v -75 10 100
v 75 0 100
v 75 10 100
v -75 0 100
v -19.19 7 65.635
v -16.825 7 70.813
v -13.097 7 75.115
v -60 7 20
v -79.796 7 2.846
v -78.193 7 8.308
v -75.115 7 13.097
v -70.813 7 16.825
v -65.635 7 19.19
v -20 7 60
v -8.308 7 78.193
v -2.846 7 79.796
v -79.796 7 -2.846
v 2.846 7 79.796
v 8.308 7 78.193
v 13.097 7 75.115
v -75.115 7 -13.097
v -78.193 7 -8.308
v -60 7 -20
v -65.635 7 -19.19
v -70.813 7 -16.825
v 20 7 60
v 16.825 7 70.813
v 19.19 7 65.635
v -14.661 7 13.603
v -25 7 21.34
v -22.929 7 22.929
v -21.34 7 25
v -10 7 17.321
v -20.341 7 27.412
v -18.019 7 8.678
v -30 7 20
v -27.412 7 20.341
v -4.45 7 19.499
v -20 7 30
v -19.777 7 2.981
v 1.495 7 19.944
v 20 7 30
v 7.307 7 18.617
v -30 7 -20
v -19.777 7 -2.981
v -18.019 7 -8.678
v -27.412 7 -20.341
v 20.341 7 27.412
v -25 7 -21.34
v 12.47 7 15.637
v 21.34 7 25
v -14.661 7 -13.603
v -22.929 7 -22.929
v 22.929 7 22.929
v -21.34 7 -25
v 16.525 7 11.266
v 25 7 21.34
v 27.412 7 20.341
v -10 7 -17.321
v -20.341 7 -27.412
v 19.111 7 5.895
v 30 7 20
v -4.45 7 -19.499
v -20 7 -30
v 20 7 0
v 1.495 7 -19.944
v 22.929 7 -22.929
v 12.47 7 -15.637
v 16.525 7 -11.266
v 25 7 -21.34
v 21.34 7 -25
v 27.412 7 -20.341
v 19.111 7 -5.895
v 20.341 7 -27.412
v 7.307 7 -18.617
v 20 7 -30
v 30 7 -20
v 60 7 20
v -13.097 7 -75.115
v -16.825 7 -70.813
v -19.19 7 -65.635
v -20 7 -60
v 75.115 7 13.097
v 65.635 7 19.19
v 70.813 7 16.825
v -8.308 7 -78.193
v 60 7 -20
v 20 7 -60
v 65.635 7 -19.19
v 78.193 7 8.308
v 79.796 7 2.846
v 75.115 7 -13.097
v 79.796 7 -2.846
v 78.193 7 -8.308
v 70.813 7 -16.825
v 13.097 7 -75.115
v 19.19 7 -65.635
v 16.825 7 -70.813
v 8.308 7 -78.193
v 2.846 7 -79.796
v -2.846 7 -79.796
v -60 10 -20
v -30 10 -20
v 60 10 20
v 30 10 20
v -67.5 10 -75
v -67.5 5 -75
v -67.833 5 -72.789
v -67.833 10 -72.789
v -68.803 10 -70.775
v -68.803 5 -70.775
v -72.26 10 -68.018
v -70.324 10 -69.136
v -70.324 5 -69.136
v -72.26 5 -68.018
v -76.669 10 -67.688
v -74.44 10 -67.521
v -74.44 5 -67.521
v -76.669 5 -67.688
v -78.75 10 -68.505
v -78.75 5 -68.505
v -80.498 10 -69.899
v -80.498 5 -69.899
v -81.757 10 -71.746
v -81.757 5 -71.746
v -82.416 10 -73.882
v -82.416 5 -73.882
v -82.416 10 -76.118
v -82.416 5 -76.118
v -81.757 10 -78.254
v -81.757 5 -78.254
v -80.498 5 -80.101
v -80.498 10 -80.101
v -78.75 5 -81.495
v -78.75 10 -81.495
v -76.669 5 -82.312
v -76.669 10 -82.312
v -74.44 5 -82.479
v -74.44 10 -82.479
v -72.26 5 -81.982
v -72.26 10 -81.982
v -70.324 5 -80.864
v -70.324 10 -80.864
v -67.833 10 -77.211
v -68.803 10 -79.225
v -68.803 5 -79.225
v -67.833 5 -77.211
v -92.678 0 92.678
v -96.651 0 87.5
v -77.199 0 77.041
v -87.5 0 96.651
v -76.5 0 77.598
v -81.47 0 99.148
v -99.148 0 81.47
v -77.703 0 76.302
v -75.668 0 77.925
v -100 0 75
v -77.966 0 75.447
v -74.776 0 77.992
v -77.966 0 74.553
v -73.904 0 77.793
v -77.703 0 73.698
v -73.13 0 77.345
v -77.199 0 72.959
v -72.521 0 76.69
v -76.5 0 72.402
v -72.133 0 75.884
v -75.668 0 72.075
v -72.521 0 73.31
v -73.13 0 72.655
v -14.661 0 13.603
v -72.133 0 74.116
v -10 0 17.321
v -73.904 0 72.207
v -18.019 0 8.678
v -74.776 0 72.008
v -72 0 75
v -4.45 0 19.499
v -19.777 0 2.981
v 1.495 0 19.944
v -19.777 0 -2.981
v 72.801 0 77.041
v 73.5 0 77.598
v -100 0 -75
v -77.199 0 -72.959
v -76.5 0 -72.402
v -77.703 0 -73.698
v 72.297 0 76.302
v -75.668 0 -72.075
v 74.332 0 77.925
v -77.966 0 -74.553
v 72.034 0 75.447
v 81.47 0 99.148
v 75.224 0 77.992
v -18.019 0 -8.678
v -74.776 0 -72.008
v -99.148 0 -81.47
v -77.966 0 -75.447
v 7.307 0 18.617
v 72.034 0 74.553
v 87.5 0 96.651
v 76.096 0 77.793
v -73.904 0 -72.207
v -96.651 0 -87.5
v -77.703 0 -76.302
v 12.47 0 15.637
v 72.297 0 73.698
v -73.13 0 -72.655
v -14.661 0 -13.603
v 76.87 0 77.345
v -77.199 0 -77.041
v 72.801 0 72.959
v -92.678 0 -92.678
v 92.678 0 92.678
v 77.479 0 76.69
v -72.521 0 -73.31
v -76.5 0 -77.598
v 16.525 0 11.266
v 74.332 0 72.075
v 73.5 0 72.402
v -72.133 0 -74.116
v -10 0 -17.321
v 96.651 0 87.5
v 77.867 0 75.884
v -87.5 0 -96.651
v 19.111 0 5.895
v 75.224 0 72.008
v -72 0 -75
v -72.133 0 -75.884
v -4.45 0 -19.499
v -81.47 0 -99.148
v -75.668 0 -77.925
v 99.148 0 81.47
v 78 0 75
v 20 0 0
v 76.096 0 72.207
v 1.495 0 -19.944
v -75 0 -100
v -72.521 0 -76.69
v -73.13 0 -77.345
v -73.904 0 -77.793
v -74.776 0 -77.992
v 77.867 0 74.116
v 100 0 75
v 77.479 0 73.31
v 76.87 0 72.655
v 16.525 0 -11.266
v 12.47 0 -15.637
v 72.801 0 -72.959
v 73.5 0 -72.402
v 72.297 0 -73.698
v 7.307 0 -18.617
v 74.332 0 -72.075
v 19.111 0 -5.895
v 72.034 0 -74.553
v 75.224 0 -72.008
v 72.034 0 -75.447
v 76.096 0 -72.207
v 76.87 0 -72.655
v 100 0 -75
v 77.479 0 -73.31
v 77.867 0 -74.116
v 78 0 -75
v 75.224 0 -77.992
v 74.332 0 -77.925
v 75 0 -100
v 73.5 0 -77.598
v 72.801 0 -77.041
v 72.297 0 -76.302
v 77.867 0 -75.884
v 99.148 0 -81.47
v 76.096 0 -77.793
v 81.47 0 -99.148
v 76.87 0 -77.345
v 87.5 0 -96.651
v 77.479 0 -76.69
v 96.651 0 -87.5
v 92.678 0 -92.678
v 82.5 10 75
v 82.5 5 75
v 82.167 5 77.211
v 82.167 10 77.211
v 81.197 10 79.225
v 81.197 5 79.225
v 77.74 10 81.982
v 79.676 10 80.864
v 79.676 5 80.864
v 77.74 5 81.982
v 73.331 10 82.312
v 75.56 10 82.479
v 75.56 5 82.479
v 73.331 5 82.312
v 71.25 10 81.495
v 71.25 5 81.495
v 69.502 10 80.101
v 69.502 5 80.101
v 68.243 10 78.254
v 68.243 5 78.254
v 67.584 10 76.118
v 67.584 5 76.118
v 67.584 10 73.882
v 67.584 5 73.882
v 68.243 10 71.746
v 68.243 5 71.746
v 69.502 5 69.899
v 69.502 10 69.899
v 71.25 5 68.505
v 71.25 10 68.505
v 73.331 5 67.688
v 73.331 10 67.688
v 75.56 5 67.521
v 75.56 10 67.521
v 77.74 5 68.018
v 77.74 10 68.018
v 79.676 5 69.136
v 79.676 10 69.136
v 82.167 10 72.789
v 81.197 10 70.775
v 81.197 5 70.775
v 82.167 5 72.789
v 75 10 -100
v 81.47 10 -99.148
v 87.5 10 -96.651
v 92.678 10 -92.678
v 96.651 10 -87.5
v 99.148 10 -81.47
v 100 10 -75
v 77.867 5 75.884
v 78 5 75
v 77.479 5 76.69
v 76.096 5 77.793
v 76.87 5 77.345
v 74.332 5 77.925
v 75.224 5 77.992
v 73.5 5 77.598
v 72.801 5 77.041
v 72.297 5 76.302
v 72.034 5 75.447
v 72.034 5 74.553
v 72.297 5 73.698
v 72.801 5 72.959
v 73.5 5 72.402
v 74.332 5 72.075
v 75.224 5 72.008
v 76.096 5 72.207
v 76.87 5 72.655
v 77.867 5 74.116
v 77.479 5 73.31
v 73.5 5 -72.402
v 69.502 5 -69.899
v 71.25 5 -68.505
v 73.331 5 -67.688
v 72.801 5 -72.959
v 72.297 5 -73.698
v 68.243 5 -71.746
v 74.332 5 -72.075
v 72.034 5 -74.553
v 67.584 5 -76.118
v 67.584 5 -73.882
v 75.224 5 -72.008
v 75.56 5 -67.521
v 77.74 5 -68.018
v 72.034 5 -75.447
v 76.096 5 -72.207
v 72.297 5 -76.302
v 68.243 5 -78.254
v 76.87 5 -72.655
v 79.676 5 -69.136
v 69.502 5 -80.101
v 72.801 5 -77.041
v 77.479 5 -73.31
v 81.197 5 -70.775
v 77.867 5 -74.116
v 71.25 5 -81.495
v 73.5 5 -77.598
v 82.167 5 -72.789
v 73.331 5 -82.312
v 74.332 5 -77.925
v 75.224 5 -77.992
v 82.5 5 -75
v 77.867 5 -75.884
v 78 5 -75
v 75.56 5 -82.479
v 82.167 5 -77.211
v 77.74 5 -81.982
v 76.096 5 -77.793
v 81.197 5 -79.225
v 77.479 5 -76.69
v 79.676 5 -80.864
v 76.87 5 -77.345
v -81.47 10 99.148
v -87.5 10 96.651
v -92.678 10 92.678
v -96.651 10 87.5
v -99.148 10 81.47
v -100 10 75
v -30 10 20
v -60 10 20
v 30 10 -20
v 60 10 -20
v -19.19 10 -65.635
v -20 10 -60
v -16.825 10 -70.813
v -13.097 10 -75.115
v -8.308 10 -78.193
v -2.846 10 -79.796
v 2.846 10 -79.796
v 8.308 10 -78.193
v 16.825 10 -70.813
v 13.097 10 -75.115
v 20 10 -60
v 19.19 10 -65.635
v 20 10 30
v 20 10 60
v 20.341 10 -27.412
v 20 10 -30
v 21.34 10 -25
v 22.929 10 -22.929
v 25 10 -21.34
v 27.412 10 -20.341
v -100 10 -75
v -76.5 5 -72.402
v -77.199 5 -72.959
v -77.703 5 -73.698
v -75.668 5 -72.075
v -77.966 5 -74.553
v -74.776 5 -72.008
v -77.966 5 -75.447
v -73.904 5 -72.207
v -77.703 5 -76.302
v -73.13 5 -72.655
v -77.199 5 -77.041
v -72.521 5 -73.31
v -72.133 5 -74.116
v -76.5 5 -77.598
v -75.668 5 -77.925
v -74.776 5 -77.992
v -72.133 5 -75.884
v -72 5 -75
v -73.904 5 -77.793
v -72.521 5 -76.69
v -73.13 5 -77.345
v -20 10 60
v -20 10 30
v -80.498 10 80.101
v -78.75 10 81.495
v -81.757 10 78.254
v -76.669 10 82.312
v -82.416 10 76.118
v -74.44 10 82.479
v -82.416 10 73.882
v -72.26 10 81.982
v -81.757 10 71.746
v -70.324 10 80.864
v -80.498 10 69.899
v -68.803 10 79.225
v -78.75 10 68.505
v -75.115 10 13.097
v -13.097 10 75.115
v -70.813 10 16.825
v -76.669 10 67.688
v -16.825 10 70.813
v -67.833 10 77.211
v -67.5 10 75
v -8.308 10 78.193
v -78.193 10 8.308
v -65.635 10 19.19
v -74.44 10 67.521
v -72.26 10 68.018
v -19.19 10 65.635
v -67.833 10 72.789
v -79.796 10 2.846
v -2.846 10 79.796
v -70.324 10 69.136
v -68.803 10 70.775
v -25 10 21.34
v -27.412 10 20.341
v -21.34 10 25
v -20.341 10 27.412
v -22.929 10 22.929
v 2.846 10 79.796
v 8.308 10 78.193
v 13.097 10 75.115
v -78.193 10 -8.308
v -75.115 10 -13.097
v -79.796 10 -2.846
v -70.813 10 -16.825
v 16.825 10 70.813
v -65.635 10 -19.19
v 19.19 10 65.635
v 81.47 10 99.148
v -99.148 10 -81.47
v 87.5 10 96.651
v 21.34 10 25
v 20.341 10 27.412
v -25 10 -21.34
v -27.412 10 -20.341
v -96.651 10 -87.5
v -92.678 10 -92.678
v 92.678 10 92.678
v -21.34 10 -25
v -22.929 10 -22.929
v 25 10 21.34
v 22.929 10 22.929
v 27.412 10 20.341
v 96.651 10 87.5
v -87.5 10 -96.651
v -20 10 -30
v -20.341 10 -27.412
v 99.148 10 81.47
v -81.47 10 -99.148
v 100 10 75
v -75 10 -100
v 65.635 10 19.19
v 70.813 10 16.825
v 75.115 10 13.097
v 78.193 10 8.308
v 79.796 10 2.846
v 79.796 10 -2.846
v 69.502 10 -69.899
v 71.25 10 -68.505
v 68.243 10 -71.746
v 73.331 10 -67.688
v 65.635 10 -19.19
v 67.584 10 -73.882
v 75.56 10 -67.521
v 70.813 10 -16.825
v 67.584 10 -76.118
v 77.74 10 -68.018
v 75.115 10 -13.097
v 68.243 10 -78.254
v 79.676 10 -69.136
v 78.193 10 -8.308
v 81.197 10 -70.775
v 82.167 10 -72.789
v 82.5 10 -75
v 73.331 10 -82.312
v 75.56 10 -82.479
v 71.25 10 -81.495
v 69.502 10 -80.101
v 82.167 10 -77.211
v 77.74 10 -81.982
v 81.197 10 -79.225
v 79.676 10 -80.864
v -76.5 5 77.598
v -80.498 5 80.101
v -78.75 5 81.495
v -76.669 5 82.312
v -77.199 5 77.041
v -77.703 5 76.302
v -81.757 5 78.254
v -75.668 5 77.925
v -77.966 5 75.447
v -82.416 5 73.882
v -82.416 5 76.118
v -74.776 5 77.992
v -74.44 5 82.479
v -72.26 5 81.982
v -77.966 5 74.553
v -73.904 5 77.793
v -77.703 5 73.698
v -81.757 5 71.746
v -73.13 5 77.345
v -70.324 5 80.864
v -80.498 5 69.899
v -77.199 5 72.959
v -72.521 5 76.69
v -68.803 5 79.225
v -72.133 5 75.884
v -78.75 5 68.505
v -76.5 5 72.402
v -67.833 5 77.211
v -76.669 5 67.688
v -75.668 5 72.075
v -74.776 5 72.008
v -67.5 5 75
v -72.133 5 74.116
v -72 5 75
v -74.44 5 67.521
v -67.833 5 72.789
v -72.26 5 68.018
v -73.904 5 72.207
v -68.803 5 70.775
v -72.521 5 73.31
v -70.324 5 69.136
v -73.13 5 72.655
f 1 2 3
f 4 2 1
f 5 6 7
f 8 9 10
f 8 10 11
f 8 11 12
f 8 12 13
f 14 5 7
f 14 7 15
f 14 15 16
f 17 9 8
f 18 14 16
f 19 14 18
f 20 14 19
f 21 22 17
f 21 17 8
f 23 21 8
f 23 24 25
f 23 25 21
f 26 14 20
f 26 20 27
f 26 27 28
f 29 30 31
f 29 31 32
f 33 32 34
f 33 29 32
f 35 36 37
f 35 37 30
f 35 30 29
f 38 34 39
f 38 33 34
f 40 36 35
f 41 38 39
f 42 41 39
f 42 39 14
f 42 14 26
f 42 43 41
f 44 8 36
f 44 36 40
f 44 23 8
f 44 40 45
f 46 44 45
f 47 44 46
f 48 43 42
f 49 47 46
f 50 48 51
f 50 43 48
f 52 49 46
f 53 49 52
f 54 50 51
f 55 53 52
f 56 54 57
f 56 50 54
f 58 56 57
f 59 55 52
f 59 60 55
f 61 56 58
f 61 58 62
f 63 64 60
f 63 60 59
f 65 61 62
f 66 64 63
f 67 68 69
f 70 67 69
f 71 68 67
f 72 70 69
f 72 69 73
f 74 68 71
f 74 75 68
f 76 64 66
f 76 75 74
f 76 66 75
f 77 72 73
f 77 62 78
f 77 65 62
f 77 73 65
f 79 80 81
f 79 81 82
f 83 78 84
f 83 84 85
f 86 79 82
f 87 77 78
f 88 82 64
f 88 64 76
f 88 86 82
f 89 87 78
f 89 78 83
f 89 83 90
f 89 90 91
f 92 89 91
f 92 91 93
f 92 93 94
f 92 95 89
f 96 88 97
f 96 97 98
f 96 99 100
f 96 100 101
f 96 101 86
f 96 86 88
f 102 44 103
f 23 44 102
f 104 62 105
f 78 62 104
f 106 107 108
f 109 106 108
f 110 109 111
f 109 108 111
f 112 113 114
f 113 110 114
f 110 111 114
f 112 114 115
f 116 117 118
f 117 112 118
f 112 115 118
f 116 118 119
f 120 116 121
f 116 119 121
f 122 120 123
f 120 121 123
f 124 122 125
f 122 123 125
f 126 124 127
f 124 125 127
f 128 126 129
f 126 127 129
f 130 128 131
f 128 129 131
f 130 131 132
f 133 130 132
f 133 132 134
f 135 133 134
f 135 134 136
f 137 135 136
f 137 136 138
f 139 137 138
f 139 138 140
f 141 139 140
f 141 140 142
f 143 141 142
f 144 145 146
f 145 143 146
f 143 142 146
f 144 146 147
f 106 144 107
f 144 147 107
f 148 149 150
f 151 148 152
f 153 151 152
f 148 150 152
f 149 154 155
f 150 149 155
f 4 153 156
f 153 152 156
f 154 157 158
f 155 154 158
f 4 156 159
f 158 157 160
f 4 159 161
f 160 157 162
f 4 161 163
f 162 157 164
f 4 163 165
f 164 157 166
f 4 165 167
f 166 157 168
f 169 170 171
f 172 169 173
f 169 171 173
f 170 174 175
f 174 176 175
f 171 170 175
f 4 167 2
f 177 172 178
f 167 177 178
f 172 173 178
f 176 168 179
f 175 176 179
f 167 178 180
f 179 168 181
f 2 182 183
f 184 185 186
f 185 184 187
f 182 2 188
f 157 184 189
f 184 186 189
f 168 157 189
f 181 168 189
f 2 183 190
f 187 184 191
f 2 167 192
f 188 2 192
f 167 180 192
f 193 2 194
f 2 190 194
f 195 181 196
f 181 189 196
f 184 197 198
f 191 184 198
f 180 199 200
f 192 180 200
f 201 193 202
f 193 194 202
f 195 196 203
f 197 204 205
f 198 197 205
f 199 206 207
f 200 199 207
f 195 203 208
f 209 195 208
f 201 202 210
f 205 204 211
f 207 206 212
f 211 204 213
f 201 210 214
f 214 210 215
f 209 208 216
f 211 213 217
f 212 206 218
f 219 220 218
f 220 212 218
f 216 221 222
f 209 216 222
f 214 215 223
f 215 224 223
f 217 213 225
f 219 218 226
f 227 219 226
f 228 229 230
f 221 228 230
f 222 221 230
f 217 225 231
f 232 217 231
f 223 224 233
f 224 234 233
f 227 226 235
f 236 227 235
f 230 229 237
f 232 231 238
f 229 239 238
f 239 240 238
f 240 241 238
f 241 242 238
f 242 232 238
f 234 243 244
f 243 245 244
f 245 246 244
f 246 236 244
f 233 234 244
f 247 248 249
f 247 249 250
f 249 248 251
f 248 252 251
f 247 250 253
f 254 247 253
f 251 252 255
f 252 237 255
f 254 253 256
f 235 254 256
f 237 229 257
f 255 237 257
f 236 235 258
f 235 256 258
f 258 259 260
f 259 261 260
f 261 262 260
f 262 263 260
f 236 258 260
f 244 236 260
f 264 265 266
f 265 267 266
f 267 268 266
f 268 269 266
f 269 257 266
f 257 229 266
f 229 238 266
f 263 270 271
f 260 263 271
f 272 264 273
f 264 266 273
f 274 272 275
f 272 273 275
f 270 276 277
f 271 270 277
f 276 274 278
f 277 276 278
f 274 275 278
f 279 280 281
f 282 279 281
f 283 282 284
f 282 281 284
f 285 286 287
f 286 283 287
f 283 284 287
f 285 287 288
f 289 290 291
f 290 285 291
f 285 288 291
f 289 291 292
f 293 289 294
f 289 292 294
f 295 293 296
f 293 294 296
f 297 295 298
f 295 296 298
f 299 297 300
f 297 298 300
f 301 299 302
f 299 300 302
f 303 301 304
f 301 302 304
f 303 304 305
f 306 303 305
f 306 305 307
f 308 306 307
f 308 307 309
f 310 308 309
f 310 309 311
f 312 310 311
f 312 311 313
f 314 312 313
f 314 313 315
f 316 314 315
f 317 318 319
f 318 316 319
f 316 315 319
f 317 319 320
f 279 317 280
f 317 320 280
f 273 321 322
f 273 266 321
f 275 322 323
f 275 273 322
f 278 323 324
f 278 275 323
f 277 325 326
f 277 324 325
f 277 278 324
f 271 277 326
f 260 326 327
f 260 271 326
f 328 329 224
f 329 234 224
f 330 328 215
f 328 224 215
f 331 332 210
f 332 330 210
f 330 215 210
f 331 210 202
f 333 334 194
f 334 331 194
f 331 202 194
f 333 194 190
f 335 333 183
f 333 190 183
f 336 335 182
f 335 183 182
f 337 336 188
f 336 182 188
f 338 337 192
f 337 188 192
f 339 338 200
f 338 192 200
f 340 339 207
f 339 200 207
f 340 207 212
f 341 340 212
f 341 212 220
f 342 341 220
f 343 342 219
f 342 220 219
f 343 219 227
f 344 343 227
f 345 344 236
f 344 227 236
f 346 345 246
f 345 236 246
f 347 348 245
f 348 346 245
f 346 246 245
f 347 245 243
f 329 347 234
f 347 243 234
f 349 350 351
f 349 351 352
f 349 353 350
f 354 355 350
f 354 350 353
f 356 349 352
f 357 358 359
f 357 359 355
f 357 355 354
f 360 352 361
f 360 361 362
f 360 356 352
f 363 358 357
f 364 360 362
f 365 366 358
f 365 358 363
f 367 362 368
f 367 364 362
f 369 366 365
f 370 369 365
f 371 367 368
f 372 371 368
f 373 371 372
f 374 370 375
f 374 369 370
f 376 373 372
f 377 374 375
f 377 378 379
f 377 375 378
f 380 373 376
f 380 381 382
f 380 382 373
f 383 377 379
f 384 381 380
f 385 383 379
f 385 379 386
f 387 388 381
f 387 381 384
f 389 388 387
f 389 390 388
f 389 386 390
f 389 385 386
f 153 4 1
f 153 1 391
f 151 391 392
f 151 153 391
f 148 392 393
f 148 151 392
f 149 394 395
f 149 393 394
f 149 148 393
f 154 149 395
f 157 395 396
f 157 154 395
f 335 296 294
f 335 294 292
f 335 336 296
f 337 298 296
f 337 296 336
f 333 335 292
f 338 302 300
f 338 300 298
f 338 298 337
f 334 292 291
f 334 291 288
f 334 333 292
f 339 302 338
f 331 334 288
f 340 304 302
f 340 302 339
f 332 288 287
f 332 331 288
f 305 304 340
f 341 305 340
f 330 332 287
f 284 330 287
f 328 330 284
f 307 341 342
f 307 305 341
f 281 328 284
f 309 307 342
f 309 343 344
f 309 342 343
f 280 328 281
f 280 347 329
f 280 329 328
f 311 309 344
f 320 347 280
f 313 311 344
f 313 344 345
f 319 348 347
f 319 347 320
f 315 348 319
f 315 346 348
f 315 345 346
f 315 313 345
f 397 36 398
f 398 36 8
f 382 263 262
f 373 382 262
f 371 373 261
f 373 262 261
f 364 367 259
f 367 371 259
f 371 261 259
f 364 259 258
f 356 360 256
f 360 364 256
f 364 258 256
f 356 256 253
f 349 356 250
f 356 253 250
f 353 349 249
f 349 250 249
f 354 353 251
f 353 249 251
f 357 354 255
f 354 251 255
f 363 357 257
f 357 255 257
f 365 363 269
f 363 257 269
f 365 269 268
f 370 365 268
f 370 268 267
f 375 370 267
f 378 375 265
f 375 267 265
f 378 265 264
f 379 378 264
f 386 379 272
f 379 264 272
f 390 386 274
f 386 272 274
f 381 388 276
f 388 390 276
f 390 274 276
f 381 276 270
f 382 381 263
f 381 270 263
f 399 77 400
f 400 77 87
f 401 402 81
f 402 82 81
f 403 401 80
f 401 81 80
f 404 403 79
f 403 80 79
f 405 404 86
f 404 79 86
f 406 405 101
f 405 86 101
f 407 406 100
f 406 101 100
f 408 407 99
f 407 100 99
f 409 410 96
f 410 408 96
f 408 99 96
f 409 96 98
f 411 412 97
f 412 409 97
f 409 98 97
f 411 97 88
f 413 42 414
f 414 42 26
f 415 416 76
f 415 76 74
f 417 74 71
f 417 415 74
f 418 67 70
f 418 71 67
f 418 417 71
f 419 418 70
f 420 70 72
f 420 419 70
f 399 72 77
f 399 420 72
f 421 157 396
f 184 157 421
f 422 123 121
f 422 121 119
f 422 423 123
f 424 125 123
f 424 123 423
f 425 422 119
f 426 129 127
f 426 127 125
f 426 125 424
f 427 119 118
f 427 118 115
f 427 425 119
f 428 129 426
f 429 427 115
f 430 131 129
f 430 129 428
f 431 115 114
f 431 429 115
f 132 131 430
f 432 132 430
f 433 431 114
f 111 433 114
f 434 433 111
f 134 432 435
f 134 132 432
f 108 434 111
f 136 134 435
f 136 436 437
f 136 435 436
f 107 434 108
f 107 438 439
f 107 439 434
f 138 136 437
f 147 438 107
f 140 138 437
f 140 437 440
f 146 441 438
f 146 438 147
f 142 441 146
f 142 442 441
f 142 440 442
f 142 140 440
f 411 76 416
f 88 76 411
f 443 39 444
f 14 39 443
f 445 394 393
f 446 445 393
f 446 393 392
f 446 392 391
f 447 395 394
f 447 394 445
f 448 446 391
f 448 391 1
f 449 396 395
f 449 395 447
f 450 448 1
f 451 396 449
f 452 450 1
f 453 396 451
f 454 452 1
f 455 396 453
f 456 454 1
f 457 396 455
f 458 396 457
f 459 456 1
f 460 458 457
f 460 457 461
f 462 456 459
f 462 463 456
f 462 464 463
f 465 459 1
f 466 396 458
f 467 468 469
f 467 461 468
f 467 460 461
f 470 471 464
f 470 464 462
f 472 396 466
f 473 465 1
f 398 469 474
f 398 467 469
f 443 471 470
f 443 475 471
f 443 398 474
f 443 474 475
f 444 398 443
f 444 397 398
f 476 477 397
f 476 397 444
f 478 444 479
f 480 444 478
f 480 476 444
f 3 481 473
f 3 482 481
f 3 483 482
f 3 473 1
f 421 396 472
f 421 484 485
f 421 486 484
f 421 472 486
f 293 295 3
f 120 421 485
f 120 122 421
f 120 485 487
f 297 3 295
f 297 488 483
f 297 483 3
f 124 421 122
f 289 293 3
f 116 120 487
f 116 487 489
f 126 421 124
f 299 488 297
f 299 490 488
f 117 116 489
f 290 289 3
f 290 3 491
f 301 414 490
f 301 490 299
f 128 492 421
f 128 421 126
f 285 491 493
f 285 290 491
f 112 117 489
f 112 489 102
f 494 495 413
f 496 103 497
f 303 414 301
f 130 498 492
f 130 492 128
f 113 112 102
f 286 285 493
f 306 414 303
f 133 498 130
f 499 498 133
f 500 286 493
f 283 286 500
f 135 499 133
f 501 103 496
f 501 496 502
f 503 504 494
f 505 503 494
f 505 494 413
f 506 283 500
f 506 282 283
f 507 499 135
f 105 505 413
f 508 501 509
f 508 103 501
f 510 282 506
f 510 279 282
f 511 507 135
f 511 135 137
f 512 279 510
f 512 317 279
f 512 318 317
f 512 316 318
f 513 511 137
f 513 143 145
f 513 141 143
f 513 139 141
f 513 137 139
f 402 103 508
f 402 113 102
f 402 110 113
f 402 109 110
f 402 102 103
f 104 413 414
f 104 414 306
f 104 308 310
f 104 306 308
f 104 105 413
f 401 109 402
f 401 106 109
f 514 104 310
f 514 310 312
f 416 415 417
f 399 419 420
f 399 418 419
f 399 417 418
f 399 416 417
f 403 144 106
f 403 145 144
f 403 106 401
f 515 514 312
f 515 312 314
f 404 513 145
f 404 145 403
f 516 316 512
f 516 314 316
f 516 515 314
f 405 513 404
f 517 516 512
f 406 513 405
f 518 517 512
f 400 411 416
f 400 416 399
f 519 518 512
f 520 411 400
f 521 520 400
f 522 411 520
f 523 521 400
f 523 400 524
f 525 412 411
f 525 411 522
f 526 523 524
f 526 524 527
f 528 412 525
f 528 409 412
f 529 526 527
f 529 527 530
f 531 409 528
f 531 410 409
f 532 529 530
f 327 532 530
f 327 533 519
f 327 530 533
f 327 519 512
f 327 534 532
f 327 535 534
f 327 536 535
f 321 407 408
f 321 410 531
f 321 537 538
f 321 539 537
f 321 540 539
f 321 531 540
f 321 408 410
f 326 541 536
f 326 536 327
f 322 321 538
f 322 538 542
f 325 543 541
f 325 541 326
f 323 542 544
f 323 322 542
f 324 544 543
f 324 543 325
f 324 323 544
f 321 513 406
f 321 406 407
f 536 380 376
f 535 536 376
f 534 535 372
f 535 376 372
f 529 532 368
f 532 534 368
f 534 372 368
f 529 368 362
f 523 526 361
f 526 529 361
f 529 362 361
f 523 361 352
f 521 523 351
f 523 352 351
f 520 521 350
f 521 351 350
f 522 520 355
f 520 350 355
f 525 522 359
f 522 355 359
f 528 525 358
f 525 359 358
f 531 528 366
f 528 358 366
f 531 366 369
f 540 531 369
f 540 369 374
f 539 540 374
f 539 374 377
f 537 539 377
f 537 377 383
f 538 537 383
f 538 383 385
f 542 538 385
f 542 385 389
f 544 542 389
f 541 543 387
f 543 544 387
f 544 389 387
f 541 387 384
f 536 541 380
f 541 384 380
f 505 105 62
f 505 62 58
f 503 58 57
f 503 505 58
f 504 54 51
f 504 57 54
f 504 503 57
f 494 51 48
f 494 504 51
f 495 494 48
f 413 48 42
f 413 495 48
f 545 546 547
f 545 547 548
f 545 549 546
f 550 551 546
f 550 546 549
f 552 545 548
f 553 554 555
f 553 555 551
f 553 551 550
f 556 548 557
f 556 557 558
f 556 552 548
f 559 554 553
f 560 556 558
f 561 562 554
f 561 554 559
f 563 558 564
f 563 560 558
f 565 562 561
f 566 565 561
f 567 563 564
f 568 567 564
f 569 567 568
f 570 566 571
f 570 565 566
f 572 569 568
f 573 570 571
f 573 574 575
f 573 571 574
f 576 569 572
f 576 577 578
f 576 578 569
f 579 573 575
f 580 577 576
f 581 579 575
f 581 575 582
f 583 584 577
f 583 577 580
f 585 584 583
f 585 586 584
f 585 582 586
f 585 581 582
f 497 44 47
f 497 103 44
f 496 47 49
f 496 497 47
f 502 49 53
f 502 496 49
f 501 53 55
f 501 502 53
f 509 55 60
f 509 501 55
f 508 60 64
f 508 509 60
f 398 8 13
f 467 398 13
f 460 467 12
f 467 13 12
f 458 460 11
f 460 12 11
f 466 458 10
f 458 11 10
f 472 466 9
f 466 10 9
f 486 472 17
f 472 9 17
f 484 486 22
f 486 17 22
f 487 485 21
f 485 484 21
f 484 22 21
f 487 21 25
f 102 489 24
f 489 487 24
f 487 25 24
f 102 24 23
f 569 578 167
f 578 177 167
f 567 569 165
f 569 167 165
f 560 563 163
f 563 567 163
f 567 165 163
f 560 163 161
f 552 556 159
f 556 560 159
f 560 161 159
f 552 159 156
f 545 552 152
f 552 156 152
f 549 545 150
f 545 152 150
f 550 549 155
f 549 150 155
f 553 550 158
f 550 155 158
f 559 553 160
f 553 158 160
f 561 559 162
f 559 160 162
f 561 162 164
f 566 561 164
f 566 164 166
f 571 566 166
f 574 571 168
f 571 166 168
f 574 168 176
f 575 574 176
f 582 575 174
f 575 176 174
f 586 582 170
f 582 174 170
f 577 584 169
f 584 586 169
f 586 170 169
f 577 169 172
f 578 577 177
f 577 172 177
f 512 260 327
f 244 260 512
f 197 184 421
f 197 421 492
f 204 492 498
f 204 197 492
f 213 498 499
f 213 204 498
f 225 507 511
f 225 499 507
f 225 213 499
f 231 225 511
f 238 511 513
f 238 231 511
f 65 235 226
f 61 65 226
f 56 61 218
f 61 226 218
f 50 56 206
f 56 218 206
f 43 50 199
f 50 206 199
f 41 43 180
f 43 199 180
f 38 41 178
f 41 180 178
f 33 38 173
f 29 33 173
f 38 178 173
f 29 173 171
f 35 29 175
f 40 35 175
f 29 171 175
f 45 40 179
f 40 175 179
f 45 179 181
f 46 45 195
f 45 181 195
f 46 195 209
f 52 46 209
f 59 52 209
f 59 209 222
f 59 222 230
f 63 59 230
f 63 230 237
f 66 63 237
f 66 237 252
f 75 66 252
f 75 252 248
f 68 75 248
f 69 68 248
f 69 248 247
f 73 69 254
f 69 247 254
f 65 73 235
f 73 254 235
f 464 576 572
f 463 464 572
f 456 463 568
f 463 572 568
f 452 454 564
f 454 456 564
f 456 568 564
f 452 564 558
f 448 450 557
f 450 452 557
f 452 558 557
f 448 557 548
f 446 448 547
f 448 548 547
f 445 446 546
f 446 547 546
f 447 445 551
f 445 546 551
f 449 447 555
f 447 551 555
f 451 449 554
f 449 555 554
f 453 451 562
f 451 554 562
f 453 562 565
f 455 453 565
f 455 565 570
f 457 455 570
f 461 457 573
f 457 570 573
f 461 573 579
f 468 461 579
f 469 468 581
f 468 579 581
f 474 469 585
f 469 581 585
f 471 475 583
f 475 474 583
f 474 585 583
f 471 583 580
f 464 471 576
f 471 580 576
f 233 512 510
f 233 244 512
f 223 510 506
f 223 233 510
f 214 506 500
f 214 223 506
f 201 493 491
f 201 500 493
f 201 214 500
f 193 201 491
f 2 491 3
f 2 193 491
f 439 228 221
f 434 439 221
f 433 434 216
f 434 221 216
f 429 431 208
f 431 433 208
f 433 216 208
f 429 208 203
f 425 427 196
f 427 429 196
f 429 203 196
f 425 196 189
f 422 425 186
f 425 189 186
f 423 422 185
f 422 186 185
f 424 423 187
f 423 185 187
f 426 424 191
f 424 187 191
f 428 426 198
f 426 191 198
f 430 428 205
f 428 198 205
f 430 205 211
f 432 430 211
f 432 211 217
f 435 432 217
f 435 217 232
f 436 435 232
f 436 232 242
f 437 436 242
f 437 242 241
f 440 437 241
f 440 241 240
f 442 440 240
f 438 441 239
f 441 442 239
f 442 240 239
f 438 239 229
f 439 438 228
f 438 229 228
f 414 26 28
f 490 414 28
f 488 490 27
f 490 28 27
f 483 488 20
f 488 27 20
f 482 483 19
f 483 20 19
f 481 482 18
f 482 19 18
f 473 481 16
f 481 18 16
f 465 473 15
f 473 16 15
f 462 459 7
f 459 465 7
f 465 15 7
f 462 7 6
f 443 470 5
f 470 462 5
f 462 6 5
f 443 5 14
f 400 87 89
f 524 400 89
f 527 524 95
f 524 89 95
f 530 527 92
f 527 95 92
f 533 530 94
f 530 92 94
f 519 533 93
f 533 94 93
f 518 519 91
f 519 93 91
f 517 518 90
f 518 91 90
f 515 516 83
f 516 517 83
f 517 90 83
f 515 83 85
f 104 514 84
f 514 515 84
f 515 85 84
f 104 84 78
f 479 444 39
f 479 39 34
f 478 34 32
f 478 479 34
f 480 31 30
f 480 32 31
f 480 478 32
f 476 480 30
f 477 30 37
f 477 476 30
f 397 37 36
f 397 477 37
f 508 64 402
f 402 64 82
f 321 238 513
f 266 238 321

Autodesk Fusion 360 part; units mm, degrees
sketch "Boceto1" plane through (0, 0, 0) normal (0, 1, 0) x (1, 0, 0)
  line L0 (-75, 100) -> (75, 100)
  line L1 (100, 75) -> (100, -75)
  line L2 (75, -100) -> (-75, -100)
  line L3 (-100, -75) -> (-100, 75)
  line L4 (-100, 100) -> (100, -100) construction
  line L5 (100, 100) -> (-100, -100) construction
  arc A0 (-75, 100) -> (-100, 75) centre (-75, 75) ccw
  arc A1 (-100, -75) -> (-75, -100) centre (-75, -75) ccw
  arc A2 (75, -100) -> (100, -75) centre (75, -75) ccw
  arc A3 (100, 75) -> (75, 100) centre (75, 75) ccw
  circle A4 centre (-75, 75) radius 3
  circle A5 centre (75, 75) radius 3
  circle A6 centre (-75, -75) radius 3
  circle A7 centre (75, -75) radius 3
  circle A8 centre (-75, 75) radius 7.5
  circle A9 centre (75, 75) radius 7.5
  circle A10 centre (-75, -75) radius 7.5
  circle A11 centre (75, -75) radius 7.5
  line L6 (0, 0) -> (0, 60)
  line L7 (20, 0) -> (20, 60)
  line L8 (-20, 0) -> (-20, 60)
  line L9 (0, -20) -> (-60, -20)
  line L10 (0, 0) -> (-60, 0)
  line L11 (0, 20) -> (-60, 20)
  line L12 (20, 0) -> (20, -60)
  line L13 (0, 0) -> (0, -60)
  line L14 (-20, 0) -> (-20, -60)
  line L15 (0, 20) -> (60, 20)
  line L16 (0, 0) -> (60, 0)
  line L17 (0, -20) -> (60, -20)
  arc A12 (20, 60) -> (-20, 60) centre (0, 60) ccw
  arc A13 (-60, 20) -> (-60, -20) centre (-60, 0) ccw
  arc A14 (-20, -60) -> (20, -60) centre (0, -60) ccw
  arc A15 (60, -20) -> (60, 20) centre (60, 0) ccw
  circle A16 centre (0, 0) radius 20
  dimension "d1" = 200
  dimension "d2" = 200
  dimension "d3" = 25
  dimension "d4" = 6
  dimension "d5" = 6
  dimension "d6" = 6
  dimension "d7" = 6
  dimension "d8" = 15
  dimension "d9" = 15
  dimension "d10" = 15
  dimension "d11" = 15
  dimension "d12" = 60
  dimension "d13" = 20
  dimension "d14" = -20
  dimension "d16" = 360
  dimension "d18" = 360
  dimension "d25" = 40
extrude "Extruir1" add sketch "Boceto1" along normal blind 10 contours L0 L1 L2 L3 A0 A1 A2 A3
extrude "Extruir2" add sketch "Boceto1" along normal blind 7 contours L6 L10 A16 | L10 L13 A16 | L13 L16 A16 | L6 L16 A16 | L8 L11 A16 | L7 L8 L11 L15 A12 | L7 L15 A16 | L8 L9 L11 L14 A13 | L9 L14 A16 | L9 L12 L14 L17 A14 | L12 L17 A16 | L7 L12 L15 L17 A15
extrude "Extruir3" add sketch "Boceto1" along normal blind 5 contours A8 | A9 | A10 | A11
extrude "Extruir4" cut sketch "Boceto1" along normal blind 40 contours L6 L10 A16 | L10 L13 A16 | L13 L16 A16 | L6 L16 A16
fillet "Empalme1" radius 10 4 edges at (-20, 8.5, -20) (20, 8.5, -20) (-20, 8.5, 20) (20, 8.5, 20)
